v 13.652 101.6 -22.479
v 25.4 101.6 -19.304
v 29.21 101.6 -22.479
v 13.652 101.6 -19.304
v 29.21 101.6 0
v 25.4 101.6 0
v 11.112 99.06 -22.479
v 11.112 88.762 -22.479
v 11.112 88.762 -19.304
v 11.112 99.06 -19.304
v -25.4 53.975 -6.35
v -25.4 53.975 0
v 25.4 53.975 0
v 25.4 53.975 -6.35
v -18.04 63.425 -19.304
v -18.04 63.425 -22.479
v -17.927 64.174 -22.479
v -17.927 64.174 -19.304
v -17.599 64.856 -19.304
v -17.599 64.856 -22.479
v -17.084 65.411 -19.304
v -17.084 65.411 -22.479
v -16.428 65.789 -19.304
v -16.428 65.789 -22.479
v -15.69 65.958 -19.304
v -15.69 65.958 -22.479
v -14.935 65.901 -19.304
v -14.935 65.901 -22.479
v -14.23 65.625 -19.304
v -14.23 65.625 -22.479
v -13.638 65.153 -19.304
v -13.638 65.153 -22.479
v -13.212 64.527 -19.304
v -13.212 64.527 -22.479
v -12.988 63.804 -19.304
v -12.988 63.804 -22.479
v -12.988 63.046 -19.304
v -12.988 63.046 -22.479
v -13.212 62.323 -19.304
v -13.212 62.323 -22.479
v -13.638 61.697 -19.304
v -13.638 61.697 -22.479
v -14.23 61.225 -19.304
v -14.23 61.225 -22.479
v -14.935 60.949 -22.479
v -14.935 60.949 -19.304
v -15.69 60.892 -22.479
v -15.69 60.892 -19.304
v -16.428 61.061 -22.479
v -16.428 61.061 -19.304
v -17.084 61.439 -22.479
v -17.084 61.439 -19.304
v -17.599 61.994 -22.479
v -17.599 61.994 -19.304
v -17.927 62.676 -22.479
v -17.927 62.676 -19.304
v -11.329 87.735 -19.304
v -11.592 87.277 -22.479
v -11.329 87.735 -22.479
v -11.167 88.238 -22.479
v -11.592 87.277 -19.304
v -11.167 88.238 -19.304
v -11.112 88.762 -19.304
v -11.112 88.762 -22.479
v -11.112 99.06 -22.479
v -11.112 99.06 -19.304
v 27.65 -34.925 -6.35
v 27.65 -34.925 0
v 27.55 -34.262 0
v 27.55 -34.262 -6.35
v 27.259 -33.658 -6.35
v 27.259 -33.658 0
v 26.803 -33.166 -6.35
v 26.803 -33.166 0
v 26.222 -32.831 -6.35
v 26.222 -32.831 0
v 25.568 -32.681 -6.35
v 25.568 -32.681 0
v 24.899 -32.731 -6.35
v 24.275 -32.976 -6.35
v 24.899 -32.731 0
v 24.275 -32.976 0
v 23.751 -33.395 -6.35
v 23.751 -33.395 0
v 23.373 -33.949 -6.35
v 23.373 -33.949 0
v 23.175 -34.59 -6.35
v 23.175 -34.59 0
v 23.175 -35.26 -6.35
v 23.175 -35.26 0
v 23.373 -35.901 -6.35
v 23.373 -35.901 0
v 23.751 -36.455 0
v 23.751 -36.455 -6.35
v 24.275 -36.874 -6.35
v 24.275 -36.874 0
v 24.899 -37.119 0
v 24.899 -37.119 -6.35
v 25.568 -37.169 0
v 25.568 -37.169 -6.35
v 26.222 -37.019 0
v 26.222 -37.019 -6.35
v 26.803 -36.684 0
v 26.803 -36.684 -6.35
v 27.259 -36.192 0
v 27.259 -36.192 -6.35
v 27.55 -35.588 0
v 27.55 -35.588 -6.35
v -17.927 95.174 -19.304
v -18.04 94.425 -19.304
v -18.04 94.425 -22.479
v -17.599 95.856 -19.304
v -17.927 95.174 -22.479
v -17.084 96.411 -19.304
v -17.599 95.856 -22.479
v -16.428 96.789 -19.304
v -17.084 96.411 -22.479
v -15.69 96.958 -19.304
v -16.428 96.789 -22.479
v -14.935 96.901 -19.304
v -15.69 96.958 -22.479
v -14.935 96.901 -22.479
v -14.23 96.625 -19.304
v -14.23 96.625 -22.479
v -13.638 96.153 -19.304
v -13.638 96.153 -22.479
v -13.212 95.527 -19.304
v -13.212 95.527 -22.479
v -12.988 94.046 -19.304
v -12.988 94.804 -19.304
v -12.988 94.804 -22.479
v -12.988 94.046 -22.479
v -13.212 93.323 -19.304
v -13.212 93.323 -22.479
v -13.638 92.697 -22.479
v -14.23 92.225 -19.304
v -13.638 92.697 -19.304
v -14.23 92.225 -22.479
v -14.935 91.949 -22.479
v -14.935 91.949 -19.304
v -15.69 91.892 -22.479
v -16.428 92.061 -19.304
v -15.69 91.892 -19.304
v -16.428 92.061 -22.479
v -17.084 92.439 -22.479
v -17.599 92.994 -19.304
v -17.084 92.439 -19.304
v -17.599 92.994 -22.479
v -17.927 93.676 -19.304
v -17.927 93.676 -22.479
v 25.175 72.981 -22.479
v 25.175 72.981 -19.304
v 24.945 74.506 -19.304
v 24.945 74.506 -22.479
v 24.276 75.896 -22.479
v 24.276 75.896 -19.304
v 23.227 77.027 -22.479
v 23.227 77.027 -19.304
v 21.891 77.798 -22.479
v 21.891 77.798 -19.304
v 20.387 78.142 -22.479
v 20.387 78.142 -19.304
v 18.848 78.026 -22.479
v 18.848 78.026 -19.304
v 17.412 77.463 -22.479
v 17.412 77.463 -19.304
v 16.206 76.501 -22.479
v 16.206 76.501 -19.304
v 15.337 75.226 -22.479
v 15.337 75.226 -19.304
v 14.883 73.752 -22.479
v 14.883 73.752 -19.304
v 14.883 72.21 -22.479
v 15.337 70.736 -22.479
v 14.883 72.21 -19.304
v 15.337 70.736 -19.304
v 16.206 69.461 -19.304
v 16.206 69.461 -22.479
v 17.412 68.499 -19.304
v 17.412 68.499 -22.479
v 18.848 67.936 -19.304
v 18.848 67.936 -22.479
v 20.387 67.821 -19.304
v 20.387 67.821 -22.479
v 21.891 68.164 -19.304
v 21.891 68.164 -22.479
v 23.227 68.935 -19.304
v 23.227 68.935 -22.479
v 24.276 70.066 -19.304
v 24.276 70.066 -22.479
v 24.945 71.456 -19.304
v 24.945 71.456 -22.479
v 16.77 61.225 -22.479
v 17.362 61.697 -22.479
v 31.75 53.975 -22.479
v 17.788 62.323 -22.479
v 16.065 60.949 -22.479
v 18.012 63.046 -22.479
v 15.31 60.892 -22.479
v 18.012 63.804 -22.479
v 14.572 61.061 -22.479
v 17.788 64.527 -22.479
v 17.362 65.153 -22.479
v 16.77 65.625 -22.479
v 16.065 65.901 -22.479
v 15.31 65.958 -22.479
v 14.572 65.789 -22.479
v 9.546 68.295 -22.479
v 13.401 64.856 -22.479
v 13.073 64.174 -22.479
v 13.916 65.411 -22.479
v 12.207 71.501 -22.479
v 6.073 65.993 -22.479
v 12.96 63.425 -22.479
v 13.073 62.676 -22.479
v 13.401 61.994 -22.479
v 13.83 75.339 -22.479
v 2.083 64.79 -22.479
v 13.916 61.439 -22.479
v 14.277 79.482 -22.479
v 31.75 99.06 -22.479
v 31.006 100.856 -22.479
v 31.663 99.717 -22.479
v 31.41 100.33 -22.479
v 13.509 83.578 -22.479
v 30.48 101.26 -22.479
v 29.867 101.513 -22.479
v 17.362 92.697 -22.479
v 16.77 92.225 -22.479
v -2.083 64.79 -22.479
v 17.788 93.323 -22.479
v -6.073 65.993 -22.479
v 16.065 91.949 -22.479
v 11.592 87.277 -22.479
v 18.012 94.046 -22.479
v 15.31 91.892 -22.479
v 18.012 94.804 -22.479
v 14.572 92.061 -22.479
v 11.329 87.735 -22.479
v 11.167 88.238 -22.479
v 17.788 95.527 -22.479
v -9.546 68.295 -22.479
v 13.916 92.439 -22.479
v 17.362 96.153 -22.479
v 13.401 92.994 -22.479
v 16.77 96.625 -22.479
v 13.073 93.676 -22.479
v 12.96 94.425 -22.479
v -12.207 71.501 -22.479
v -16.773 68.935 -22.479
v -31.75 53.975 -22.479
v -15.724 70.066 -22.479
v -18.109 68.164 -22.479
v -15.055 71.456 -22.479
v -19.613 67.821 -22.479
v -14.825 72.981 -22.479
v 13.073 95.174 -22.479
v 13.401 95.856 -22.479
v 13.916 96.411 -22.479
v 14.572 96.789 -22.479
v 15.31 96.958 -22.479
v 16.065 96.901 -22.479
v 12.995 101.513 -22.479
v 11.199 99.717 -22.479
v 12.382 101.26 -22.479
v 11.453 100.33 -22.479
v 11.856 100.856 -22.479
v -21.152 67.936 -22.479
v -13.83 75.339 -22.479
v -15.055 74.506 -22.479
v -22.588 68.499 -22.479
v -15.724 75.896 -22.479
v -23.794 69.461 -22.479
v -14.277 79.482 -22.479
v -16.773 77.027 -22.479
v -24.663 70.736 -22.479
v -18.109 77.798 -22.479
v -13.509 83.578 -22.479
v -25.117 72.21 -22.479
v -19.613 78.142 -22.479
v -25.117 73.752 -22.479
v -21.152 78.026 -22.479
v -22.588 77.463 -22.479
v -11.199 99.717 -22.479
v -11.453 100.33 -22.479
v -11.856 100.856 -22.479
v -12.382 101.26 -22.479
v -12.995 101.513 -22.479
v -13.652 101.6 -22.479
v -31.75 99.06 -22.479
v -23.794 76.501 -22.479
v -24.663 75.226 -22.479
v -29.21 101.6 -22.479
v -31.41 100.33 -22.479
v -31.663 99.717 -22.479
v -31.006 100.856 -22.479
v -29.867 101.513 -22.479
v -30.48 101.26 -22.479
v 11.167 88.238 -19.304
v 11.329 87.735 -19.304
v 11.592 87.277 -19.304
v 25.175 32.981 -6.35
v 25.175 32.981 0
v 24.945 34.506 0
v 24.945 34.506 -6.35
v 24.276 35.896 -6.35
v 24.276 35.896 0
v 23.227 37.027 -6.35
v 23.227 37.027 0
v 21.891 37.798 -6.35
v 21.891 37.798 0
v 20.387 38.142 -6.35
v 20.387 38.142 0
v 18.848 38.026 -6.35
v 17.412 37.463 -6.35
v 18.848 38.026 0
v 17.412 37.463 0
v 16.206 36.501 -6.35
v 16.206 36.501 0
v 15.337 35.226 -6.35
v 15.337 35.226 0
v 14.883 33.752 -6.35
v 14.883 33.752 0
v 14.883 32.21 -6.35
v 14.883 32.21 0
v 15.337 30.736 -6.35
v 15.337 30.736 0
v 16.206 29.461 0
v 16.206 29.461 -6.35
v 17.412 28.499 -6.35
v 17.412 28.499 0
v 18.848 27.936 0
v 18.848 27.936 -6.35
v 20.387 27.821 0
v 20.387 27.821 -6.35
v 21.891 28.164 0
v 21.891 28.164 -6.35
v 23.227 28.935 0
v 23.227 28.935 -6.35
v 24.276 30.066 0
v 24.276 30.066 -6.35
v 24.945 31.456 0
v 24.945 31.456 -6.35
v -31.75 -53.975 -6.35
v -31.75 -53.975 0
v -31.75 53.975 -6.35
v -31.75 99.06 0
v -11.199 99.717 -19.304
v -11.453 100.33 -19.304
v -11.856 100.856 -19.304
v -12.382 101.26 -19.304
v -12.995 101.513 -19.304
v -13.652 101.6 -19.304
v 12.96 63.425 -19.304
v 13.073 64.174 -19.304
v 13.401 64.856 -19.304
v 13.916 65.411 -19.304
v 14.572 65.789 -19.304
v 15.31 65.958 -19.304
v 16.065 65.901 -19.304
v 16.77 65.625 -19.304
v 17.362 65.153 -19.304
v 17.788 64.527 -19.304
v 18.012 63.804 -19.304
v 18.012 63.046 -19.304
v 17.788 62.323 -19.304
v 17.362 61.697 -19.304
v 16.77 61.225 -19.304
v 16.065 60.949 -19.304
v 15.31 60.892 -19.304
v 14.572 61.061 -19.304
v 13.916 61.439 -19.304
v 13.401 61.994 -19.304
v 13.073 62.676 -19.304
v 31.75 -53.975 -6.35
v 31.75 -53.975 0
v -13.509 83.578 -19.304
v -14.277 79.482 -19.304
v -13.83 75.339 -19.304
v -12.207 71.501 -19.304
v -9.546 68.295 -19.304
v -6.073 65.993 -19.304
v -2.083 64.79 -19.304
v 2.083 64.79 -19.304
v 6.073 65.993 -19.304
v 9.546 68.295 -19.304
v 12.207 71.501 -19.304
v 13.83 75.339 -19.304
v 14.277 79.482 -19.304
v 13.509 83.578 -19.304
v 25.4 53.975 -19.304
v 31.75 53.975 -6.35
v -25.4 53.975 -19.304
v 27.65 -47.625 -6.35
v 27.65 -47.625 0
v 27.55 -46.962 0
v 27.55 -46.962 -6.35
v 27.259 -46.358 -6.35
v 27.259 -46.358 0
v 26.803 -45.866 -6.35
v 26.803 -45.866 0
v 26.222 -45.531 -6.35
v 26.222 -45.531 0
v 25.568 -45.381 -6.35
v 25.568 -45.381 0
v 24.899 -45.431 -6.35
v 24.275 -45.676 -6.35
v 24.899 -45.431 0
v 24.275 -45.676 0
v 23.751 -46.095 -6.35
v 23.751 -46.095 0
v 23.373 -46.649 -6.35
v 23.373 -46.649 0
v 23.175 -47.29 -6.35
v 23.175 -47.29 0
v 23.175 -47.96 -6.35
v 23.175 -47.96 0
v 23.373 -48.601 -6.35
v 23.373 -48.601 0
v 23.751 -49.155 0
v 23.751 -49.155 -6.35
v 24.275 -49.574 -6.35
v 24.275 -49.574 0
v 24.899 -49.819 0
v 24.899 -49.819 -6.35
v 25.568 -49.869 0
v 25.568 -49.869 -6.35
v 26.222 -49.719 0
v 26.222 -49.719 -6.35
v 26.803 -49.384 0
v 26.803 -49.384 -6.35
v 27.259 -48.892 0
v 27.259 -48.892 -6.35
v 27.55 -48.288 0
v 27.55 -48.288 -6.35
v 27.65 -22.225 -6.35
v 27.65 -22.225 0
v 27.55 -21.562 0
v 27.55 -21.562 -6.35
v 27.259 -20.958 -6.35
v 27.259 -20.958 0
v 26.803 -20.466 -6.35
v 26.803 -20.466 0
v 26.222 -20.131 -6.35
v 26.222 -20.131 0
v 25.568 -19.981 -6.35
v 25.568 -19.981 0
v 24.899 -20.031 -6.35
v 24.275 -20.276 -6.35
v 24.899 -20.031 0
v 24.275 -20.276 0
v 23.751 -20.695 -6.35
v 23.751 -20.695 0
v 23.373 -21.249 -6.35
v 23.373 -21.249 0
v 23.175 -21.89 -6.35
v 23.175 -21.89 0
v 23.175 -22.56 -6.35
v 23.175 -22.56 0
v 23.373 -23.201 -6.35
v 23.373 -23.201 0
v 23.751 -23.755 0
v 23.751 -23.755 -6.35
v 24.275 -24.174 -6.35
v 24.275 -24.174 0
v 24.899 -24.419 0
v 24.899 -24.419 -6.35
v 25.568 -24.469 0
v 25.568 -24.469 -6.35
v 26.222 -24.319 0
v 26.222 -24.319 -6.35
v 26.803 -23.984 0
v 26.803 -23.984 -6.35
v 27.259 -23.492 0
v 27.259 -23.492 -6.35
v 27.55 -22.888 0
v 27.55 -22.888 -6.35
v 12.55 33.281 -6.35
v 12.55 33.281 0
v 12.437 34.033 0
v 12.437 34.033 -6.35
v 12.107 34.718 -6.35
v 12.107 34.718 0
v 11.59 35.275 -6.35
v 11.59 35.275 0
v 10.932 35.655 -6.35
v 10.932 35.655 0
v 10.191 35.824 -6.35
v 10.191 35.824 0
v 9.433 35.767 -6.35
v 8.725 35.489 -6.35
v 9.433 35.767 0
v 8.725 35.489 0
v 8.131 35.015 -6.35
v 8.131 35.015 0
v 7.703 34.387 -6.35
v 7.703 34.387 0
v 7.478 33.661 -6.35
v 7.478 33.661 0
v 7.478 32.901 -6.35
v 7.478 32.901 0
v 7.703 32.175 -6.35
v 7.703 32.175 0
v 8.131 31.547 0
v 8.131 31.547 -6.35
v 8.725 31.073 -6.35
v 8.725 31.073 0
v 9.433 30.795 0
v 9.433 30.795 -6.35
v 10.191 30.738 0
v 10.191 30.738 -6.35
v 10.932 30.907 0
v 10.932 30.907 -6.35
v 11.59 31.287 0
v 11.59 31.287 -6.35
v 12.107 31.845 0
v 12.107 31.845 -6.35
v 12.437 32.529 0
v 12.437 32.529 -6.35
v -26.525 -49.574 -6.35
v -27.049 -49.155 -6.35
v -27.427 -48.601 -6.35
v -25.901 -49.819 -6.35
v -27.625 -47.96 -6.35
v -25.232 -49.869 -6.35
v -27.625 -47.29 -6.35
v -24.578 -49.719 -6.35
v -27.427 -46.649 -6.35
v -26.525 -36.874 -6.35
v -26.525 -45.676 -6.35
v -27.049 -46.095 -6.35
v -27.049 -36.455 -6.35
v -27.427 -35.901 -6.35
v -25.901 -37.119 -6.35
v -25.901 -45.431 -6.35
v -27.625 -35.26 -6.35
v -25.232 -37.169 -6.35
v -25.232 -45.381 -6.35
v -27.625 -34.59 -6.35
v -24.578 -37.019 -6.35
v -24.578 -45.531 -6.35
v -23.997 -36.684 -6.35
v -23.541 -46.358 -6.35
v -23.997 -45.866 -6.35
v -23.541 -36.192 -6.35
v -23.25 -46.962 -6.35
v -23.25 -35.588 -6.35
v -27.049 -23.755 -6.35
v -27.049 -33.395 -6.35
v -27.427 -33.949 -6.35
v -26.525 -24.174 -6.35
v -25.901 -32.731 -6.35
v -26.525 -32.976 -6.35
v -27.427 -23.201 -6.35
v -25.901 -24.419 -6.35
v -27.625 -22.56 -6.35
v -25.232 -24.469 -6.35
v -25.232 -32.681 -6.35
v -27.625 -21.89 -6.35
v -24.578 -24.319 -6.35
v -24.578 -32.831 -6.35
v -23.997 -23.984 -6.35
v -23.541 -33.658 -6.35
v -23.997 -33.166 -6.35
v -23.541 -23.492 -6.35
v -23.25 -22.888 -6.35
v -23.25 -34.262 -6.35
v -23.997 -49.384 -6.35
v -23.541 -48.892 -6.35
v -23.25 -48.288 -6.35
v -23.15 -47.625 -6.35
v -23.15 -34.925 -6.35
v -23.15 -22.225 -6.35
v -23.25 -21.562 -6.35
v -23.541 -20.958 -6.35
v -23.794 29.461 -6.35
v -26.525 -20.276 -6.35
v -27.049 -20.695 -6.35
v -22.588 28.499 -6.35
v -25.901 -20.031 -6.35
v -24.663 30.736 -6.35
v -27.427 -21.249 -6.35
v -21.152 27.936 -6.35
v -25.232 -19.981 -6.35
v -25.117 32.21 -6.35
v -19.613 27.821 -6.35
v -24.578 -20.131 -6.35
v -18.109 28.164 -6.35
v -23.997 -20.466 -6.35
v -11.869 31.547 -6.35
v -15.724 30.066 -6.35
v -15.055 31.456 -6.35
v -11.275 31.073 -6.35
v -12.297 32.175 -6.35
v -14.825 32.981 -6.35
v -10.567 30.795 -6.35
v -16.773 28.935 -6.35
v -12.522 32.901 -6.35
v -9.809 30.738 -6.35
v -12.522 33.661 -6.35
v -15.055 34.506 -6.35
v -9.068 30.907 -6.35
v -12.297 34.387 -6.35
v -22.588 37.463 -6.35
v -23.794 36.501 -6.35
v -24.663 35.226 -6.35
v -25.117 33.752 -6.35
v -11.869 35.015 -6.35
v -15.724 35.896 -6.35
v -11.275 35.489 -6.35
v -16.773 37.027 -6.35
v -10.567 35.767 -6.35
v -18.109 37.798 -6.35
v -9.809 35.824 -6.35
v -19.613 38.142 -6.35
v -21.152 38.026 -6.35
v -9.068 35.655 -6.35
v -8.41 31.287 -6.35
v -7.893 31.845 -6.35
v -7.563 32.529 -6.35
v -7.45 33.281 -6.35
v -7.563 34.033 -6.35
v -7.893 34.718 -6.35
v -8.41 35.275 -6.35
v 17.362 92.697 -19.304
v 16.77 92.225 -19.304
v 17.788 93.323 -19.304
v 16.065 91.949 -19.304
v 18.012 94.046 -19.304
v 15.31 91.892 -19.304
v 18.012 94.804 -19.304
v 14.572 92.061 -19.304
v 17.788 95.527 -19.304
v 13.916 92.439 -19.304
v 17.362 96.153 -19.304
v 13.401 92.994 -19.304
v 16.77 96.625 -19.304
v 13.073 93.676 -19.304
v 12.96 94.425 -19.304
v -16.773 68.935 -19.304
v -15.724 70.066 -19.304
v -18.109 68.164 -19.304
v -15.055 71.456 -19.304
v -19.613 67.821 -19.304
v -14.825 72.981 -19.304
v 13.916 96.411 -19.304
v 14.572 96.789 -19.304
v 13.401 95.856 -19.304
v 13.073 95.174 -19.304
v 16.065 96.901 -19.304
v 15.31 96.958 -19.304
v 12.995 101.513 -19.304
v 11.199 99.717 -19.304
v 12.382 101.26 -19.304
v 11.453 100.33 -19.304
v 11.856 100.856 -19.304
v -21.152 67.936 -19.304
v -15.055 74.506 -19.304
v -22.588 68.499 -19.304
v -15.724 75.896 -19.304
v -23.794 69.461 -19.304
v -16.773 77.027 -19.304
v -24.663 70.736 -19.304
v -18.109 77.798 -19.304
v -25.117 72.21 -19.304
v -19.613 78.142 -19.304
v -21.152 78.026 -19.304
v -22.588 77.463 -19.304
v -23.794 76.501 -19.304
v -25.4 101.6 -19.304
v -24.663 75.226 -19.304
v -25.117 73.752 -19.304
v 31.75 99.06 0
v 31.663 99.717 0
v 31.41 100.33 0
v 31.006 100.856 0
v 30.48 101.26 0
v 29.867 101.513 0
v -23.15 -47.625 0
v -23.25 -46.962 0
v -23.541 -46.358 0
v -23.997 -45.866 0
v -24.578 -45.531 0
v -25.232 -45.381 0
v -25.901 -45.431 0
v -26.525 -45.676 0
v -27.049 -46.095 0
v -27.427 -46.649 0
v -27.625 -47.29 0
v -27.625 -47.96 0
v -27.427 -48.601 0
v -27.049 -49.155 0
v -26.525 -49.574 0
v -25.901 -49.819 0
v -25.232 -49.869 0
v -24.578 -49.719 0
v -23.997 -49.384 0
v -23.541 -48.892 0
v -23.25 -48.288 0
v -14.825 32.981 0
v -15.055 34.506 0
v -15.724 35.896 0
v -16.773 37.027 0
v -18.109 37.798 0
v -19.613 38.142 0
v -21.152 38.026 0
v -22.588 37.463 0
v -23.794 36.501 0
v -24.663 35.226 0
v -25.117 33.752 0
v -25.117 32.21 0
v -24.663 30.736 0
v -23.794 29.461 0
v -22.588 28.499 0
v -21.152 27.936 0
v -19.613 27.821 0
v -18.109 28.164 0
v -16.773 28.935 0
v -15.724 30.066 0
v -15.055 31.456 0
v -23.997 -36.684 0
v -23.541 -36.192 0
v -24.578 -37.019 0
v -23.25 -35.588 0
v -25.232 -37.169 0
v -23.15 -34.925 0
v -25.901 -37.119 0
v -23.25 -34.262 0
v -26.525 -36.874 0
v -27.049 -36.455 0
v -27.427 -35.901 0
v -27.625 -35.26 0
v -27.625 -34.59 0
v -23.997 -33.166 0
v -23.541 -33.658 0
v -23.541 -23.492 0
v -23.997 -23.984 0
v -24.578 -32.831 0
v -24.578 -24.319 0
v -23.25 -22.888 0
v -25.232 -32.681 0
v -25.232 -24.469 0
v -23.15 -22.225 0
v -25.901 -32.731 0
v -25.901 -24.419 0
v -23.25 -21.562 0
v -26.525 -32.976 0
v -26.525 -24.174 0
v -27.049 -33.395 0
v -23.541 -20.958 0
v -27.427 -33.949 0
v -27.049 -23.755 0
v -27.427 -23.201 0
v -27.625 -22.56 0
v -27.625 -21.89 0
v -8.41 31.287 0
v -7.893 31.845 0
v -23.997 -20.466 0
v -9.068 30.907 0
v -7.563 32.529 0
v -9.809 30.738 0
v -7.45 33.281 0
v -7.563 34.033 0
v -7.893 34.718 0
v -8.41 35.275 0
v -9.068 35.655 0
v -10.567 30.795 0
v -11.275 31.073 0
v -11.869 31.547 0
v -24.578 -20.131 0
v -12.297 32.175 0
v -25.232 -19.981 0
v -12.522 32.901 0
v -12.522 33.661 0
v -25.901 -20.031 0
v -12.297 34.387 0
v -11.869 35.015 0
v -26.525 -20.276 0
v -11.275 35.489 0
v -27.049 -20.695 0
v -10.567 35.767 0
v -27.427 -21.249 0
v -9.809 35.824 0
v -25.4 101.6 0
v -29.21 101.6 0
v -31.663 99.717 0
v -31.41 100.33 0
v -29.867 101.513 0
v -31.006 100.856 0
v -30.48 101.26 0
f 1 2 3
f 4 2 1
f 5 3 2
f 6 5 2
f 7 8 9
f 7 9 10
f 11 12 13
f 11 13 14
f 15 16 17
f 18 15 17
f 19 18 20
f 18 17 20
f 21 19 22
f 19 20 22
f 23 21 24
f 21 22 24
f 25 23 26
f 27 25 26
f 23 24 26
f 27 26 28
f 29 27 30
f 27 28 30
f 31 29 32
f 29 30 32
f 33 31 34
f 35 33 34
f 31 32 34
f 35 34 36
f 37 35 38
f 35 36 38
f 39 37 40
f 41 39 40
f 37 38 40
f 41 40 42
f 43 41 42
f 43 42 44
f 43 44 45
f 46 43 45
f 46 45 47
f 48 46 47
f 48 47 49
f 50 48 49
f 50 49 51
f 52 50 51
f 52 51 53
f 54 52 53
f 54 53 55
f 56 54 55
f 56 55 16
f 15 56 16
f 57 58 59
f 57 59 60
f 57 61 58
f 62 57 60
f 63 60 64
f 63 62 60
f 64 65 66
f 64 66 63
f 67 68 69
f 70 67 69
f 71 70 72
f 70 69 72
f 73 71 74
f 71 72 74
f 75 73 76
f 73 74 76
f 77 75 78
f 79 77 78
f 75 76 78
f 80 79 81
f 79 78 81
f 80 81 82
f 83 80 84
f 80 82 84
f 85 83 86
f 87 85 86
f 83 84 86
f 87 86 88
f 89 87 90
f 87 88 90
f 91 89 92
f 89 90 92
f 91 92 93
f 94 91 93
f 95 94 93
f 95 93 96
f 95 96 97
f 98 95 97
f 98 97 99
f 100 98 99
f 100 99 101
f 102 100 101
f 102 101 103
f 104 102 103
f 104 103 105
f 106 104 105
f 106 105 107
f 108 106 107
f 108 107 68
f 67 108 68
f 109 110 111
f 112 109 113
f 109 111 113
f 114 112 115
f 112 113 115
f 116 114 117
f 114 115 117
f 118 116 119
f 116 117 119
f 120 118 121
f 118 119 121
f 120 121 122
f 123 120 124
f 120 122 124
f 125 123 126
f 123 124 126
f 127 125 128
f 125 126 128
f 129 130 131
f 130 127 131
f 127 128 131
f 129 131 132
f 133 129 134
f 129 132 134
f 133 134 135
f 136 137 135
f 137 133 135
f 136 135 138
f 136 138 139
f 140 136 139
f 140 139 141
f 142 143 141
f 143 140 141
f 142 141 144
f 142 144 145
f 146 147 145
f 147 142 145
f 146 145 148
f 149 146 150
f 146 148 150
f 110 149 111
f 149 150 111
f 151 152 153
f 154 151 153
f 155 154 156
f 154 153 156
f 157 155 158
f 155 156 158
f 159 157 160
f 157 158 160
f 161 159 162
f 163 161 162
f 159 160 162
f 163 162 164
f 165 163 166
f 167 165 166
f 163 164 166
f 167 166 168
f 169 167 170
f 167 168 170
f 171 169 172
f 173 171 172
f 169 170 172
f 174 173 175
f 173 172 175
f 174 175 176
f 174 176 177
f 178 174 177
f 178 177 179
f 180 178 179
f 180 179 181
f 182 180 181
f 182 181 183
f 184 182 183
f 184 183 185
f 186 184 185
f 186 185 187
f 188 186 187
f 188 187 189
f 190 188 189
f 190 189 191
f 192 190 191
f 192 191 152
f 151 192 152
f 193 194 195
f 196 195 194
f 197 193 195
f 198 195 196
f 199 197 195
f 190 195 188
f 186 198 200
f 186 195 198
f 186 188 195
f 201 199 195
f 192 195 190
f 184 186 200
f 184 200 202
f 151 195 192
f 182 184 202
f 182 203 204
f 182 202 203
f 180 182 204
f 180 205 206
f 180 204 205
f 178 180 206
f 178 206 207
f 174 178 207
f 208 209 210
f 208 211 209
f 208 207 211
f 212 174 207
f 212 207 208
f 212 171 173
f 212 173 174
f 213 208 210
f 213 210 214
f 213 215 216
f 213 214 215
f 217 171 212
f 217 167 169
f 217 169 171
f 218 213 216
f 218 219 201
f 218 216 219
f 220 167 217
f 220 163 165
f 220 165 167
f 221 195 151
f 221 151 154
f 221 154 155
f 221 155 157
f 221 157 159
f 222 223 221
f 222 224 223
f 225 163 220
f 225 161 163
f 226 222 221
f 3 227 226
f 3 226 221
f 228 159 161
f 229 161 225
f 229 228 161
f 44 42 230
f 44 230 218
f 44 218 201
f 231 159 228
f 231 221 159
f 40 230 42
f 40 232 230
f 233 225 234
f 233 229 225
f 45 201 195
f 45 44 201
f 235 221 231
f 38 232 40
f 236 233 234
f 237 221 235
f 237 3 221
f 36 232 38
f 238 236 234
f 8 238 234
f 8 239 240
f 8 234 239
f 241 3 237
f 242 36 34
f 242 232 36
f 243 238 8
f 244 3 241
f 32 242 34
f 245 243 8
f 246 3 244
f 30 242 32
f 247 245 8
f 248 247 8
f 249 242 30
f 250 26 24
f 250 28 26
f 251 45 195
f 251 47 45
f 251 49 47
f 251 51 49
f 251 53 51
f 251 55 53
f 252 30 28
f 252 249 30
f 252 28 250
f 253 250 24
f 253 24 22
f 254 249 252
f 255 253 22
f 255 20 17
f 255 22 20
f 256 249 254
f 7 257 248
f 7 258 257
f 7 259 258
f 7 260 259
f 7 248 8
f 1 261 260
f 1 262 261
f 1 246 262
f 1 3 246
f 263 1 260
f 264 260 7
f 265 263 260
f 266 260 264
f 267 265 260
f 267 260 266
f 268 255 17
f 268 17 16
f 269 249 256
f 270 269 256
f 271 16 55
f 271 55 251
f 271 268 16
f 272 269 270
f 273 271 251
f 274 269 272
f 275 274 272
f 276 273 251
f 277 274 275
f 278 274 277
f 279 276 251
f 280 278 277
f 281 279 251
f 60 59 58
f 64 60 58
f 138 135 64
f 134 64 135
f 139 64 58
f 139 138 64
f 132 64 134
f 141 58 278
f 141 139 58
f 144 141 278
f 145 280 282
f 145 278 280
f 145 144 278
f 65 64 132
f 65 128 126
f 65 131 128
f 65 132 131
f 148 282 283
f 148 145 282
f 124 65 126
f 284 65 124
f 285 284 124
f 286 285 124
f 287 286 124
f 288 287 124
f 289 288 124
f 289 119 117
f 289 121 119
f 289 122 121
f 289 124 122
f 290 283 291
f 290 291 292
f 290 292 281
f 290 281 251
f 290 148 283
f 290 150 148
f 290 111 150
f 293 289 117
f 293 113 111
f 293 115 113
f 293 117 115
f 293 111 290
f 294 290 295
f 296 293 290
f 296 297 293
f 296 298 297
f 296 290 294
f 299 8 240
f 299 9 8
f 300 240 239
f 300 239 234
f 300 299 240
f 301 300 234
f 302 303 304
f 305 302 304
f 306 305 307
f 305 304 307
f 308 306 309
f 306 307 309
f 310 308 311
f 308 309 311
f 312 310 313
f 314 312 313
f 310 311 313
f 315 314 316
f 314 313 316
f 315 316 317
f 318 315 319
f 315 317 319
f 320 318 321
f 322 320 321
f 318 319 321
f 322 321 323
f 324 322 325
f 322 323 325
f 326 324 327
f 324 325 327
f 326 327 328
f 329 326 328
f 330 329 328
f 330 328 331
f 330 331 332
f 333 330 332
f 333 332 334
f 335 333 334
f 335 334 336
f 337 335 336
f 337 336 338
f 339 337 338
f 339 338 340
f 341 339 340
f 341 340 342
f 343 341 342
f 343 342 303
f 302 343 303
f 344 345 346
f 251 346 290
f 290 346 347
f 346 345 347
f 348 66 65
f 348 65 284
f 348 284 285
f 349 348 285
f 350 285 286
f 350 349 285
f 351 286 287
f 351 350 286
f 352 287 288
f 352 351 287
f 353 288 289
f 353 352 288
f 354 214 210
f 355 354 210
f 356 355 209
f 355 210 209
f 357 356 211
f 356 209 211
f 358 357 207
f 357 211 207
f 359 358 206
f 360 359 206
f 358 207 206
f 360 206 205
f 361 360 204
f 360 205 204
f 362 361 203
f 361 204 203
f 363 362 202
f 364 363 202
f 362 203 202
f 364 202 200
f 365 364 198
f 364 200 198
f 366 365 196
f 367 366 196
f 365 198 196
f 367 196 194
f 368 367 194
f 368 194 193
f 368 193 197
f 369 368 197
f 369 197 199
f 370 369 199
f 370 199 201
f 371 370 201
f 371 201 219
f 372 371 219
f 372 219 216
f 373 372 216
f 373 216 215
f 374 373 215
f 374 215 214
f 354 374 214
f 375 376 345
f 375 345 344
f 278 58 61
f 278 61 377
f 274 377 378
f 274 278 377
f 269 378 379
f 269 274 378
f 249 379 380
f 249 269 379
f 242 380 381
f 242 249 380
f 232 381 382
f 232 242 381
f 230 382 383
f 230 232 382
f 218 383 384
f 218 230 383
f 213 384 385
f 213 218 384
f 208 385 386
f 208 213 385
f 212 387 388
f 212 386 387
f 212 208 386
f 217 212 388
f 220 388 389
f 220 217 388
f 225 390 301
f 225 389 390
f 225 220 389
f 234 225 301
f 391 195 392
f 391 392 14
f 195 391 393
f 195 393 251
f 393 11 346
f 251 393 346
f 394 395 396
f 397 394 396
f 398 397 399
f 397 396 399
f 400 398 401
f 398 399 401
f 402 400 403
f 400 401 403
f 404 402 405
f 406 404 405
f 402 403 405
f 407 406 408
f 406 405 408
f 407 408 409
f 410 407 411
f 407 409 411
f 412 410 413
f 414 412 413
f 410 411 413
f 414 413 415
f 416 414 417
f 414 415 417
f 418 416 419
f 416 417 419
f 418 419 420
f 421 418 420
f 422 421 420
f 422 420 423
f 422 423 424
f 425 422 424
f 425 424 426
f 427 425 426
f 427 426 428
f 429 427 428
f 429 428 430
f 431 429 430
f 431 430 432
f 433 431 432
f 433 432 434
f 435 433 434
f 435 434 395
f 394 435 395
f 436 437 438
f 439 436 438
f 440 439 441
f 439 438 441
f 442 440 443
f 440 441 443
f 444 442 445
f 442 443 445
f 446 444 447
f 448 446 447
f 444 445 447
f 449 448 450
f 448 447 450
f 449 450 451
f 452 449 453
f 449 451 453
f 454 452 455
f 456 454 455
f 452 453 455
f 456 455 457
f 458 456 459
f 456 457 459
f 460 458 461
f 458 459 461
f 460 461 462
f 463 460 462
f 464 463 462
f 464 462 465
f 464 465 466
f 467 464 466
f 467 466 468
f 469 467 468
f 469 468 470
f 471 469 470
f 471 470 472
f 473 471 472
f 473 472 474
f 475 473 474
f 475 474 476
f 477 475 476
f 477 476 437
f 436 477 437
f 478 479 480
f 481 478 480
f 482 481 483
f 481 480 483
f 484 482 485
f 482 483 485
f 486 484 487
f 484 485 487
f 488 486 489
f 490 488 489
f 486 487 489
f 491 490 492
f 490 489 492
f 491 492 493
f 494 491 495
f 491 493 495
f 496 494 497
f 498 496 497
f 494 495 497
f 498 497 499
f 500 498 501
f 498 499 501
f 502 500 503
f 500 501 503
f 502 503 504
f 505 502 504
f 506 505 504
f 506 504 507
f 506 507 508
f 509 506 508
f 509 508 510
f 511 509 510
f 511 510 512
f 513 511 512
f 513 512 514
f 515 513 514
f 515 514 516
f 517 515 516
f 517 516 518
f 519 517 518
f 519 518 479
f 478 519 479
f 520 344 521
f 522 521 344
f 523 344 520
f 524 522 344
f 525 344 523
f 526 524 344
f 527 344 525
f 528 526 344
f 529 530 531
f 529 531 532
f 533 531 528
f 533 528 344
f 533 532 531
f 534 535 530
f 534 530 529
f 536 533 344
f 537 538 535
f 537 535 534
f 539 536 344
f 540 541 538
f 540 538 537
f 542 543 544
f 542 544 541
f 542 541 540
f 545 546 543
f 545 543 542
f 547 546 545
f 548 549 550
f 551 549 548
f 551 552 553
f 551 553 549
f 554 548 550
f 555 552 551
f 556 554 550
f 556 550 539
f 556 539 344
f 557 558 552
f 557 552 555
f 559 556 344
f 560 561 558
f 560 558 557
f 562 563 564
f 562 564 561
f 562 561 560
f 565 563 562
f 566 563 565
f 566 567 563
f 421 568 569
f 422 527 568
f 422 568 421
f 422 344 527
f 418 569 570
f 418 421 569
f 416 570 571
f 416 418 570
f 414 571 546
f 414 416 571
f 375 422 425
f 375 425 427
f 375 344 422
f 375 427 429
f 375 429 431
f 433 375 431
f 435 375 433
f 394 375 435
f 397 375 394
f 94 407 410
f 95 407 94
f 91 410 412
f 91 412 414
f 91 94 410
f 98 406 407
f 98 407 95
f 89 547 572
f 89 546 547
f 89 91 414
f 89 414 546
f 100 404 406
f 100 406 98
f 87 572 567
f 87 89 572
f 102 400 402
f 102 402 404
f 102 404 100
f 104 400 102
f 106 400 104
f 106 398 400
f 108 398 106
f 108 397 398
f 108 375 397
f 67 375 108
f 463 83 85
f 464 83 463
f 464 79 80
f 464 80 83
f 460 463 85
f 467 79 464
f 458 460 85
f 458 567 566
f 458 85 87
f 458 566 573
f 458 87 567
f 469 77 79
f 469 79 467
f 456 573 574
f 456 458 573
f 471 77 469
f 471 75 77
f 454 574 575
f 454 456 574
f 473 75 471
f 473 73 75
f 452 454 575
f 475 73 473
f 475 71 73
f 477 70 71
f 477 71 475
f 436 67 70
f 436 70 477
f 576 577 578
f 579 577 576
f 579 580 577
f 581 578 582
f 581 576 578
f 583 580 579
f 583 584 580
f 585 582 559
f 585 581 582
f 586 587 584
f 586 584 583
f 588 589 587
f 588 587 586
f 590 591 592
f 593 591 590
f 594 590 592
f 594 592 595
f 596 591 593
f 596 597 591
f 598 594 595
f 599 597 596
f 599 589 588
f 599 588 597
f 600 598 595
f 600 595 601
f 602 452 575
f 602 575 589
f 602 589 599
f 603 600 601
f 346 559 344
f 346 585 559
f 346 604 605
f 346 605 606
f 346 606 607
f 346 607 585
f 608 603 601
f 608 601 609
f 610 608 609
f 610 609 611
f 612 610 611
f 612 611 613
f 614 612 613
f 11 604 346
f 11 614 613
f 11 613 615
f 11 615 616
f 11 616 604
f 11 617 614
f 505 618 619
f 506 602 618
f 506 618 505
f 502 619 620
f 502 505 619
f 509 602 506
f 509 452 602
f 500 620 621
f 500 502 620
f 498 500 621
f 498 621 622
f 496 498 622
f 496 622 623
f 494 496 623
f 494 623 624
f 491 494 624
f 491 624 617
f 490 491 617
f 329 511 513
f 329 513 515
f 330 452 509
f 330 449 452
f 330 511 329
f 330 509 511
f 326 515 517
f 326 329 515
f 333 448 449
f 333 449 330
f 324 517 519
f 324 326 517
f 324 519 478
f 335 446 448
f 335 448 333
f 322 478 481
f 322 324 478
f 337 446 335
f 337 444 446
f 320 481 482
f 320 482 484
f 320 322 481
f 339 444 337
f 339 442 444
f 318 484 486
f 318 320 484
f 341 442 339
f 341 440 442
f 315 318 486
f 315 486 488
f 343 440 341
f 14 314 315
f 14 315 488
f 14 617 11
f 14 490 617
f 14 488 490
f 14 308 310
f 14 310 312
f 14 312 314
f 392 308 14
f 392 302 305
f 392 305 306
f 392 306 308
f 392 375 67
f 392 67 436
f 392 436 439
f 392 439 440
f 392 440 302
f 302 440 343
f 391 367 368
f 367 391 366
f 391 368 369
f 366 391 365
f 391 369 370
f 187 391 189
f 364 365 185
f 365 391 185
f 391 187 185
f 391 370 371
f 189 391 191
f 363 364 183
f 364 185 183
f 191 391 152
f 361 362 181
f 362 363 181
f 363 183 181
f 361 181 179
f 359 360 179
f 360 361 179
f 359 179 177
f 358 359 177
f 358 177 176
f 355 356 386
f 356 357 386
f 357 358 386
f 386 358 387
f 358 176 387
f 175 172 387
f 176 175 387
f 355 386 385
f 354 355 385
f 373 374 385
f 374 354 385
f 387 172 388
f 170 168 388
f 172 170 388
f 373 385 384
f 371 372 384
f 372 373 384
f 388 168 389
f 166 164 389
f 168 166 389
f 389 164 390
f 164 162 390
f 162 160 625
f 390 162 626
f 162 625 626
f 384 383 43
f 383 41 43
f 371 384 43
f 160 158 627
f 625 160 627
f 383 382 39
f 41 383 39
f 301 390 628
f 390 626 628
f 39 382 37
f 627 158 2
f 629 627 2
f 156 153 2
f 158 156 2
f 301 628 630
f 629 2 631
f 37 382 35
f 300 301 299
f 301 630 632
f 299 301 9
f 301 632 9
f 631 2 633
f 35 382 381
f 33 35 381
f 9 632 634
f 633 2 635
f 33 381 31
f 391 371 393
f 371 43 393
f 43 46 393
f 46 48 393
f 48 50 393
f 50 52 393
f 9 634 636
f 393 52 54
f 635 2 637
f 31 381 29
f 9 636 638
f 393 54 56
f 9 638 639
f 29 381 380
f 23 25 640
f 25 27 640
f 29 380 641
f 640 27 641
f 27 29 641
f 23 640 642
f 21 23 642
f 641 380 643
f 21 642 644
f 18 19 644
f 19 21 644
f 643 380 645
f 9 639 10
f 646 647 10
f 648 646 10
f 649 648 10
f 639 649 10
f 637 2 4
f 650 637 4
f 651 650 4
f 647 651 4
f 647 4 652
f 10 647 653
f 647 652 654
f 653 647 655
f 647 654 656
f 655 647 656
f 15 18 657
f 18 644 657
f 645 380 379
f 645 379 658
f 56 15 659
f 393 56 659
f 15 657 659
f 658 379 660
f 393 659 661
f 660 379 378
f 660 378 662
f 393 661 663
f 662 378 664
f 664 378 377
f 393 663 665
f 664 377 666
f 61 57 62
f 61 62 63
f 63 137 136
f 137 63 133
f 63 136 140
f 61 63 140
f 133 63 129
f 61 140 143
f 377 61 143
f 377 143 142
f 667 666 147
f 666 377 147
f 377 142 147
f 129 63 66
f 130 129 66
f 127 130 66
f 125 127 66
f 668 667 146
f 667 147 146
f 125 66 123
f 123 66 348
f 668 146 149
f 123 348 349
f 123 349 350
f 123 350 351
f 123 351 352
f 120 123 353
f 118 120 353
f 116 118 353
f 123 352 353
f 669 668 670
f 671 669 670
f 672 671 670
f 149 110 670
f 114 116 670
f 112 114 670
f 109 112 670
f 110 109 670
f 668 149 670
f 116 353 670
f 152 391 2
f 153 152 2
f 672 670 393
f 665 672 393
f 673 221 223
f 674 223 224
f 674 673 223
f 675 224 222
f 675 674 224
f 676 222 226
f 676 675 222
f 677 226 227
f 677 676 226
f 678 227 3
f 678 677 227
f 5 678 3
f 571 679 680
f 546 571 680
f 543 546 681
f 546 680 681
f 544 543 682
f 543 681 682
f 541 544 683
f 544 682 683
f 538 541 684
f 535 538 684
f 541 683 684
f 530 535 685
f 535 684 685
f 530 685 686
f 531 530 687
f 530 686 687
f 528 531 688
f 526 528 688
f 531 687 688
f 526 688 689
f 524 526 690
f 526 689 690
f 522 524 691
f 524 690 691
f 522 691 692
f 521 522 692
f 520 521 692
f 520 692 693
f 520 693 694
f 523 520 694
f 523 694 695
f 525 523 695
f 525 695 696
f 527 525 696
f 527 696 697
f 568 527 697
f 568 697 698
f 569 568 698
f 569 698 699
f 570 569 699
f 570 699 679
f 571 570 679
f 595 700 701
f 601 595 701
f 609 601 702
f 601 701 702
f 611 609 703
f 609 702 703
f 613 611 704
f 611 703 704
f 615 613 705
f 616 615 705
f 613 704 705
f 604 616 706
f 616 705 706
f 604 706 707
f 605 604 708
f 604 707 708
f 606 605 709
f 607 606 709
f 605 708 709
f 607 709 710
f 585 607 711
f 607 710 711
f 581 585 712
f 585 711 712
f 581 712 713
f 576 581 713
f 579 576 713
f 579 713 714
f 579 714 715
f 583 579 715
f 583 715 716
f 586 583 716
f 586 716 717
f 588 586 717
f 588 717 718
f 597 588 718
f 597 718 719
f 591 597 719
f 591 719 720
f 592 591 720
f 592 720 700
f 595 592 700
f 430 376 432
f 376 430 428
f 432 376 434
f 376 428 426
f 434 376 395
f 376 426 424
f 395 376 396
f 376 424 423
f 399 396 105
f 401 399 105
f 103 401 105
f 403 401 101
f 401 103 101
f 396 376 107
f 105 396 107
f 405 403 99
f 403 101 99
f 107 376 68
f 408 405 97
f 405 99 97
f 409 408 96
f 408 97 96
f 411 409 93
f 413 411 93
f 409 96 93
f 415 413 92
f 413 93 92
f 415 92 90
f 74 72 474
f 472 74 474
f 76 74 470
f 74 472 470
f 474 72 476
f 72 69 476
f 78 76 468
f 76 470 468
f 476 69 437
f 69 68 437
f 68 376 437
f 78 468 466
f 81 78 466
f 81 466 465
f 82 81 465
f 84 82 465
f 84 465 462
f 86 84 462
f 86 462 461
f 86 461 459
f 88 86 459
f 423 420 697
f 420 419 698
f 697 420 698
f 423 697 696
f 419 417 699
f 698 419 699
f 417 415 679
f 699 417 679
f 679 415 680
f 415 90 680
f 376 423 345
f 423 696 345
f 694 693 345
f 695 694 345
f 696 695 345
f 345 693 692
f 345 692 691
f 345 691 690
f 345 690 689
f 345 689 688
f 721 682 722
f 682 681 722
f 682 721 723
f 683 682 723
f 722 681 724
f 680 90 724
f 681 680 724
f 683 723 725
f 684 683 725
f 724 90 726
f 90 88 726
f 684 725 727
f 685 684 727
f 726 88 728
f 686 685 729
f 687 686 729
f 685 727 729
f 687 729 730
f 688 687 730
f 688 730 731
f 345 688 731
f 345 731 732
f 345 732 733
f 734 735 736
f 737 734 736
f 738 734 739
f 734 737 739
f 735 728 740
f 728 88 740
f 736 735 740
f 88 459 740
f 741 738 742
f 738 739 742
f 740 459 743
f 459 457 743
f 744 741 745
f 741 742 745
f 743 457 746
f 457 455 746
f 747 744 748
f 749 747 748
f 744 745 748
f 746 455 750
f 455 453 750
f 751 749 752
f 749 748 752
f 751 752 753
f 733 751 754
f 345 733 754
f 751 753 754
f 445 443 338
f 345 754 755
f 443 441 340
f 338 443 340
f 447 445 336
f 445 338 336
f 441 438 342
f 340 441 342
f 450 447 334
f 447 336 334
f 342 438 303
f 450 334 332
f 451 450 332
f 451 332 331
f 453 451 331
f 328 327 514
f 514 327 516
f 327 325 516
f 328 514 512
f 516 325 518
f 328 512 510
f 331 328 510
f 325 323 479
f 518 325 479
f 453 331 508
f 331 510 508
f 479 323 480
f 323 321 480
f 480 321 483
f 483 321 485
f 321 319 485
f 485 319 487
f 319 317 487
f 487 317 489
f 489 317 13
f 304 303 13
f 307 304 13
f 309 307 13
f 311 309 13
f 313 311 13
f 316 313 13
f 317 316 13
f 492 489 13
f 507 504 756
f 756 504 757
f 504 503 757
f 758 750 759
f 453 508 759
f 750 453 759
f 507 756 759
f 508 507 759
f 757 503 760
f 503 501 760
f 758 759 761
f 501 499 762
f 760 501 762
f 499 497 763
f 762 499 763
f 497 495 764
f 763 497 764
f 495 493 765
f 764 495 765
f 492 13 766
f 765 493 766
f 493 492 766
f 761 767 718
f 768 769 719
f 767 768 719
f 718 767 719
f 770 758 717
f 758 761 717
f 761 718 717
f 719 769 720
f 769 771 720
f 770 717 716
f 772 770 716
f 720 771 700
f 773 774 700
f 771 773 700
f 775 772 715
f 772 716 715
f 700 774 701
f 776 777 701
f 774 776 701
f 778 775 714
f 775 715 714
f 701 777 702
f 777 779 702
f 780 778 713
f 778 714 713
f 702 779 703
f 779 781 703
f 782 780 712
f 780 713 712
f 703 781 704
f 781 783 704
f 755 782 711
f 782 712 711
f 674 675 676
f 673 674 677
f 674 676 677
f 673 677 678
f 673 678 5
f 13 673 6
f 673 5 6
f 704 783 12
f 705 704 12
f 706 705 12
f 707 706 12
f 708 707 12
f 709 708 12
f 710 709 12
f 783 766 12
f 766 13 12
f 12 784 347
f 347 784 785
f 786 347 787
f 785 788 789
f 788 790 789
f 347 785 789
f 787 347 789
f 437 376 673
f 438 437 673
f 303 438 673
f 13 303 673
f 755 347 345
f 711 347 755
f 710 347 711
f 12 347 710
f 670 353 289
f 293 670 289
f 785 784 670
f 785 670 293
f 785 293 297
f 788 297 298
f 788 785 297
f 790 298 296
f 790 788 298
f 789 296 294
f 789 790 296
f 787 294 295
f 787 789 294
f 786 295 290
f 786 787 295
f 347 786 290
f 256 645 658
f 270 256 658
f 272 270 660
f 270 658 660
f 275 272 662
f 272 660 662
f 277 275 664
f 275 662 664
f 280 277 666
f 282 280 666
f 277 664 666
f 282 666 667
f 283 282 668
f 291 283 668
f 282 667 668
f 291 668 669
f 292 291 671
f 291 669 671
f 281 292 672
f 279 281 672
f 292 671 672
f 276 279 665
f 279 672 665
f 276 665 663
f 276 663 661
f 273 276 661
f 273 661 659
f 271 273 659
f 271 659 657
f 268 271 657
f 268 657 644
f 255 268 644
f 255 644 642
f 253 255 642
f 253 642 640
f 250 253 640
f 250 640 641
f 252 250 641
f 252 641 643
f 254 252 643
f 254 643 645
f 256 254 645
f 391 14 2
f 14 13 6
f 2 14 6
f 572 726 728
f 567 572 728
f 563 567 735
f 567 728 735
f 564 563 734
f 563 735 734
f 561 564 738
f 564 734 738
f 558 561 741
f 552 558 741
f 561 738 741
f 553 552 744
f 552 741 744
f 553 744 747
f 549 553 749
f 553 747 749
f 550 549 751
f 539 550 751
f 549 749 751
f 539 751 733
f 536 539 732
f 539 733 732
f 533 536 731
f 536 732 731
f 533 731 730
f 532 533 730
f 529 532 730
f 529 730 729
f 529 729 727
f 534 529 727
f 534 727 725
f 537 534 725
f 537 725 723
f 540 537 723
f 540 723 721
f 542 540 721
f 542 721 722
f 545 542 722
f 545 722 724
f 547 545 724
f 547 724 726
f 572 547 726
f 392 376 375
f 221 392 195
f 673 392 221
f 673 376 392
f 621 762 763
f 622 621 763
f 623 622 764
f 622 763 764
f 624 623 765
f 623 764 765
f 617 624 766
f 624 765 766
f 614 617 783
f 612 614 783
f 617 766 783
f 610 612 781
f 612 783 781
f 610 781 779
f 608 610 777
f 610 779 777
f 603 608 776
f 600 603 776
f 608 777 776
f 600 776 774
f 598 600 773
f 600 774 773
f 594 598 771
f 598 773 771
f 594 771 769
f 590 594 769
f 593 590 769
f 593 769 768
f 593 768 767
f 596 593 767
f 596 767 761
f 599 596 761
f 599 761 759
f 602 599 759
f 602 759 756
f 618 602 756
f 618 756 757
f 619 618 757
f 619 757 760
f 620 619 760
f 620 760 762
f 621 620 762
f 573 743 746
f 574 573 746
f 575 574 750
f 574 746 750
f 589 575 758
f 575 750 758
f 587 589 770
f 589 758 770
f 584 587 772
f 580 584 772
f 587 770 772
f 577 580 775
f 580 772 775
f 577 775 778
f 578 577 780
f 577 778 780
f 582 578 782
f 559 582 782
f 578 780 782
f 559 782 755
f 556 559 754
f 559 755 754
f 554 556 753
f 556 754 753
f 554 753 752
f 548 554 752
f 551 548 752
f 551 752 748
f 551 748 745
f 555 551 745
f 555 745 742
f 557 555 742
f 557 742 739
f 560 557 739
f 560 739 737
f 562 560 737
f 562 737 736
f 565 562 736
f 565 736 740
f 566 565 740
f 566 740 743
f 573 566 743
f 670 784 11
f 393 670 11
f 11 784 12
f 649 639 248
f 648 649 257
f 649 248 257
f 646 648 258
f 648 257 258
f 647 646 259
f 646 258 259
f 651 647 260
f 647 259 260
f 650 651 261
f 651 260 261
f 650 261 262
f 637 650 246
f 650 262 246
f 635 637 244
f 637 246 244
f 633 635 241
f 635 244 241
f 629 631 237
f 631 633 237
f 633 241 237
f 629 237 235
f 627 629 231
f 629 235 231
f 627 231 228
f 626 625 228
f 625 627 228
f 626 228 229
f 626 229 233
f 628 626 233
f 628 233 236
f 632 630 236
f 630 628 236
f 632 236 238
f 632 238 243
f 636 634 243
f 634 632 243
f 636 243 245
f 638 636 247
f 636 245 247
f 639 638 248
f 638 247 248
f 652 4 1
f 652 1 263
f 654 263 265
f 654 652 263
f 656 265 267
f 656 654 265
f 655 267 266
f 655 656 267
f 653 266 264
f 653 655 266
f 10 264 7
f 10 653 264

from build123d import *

# Parameters (mm, degrees)
SKETCH1_W           = 6.35
SKETCH1_H           = 107.95
BOSS_EXTRUDE1_DEPTH = 31.75
BOSS_EXTRUDE2_DEPTH = 19.304
SKETCH3_W           = 63.5
SKETCH3_H           = 47.625
BOSS_EXTRUDE3_DEPTH = 3.175
SKETCH5_R           = 2.54
CUT_EXTRUDE2_DEPTH  = 23.479
FILLET1_R           = 2.54
CUT_EXTRUDE4_START  = -6.35
SKETCH7_W           = 50.8
SKETCH7_H           = 19.304
CUT_EXTRUDE4_DEPTH  = 6.35
SKETCH9_R           = 2.25
CUT_EXTRUDE5_DEPTH  = 23.479
SKETCH15_R          = 2.55
SKETCH15_R_2        = 5.175
CUT_EXTRUDE8_DEPTH  = 23.479
LPATTERN1_COUNT     = 3
LPATTERN1_PITCH     = 12.7


with BuildPart() as part:
    # Sketch1 → Boss-Extrude1 (new body, symmetric)
    with BuildSketch(Plane(origin=(0, 0, 0), x_dir=(0, 0, -1), z_dir=(1, 0, 0))):
        with Locations((3.175, 0)):
            Rectangle(SKETCH1_W, SKETCH1_H)
    extrude(amount=BOSS_EXTRUDE1_DEPTH, both=True)

    # Sketch2 → Boss-Extrude2 (add)
    with BuildSketch(Plane.XY):
        Polygon((-31.75, 53.975), (-31.75, 101.6), (-25.4, 101.6), (25.4, 101.6), (31.75, 101.6), (31.75, 53.975), (25.4, 53.975), (25.4, 95.25), (-25.4, 95.25), (-25.4, 53.975), align=None)
    extrude(amount=-BOSS_EXTRUDE2_DEPTH)

    # Sketch3 → Boss-Extrude3 (add)
    with BuildSketch(Plane(origin=(0, 0, -19.304), x_dir=(-1, 0, 0), z_dir=(0, 0, -1))):
        with Locations((0, 77.7875)):
            Rectangle(SKETCH3_W, SKETCH3_H)
    extrude(amount=BOSS_EXTRUDE3_DEPTH)

    # Sketch5 → Cut-Extrude2 (cut, through all)
    with BuildSketch(Plane(origin=(0, 0, -22.479), x_dir=(-1, 0, 0), z_dir=(0, 0, -1))):
        with Locations((15.5, 94.425)):
            Circle(SKETCH5_R)
        with Locations((15.5, 63.425)):
            Circle(SKETCH5_R)
        with Locations((-15.5, 63.425)):
            Circle(SKETCH5_R)
        with Locations((-15.5, 94.425)):
            Circle(SKETCH5_R)
        with BuildLine():
            Line((-11.1125, 87.905256121), (-11.1125, 101.6))
            Line((-11.1125, 101.6), (11.1125, 101.6))
            Line((11.1125, 101.6), (11.1125, 87.905256121))
            ThreePointArc((11.1125, 87.905256121), (0, 64.6375), (-11.1125, 87.905256121))
        make_face()
    extrude(amount=-CUT_EXTRUDE2_DEPTH, mode=Mode.SUBTRACT)

    # Fillet1
    fillet1_edges = [part.edges().sort_by_distance(p)[0] for p in [
        (-31.75, 101.6, -11.2395),
        (31.75, 101.6, -11.2395),
        (-11.1125, 87.905256121, -20.8915),
        (11.1125, 87.905256121, -20.8915),
        (11.1125, 101.6, -11.2395),
        (-11.1125, 101.6, -11.2395),
    ]]
    fillet(fillet1_edges, radius=FILLET1_R)

    # Sketch7 → Cut-Extrude4 (cut)
    with BuildSketch(Plane(origin=(0, 101.6, 0), x_dir=(1, 0, 0), z_dir=(0, 1, 0)).offset(CUT_EXTRUDE4_START)):
        with Locations((0, 9.652)):
            Rectangle(SKETCH7_W, SKETCH7_H)
    extrude(amount=CUT_EXTRUDE4_DEPTH, mode=Mode.SUBTRACT)

    # Sketch9 → Cut-Extrude5 (cut, through all)
    with BuildSketch(Plane.XY):
        with Locations((25.4, -47.625)):
            Circle(SKETCH9_R)
        with Locations((-25.4, -47.625)):
            Circle(SKETCH9_R)
    cut_extrude5 = extrude(amount=-CUT_EXTRUDE5_DEPTH, mode=Mode.SUBTRACT)

    # Sketch15 → Cut-Extrude8 (cut, through all)
    with BuildSketch(Plane.XY):
        with Locations((10, 72.981043446)):
            Circle(SKETCH15_R)
        with Locations((-10, 33.281043446)):
            Circle(SKETCH15_R)
        with Locations((-10, 72.981043446)):
            Circle(SKETCH15_R)
        with Locations((10, 33.281043446)):
            Circle(SKETCH15_R)
        with Locations((-20, 72.981043446)):
            Circle(SKETCH15_R_2)
        with Locations((20, 72.981043446)):
            Circle(SKETCH15_R_2)
        with Locations((20, 32.981043446)):
            Circle(SKETCH15_R_2)
        with Locations((-20, 32.981043446)):
            Circle(SKETCH15_R_2)
    extrude(amount=-CUT_EXTRUDE8_DEPTH, mode=Mode.SUBTRACT)

    # LPattern1: Cut-Extrude5 ×3
    with Locations(*[(0, i * LPATTERN1_PITCH, 0) for i in range(1, LPATTERN1_COUNT)]):
        add(cut_extrude5, mode=Mode.SUBTRACT)


solid = part.part
